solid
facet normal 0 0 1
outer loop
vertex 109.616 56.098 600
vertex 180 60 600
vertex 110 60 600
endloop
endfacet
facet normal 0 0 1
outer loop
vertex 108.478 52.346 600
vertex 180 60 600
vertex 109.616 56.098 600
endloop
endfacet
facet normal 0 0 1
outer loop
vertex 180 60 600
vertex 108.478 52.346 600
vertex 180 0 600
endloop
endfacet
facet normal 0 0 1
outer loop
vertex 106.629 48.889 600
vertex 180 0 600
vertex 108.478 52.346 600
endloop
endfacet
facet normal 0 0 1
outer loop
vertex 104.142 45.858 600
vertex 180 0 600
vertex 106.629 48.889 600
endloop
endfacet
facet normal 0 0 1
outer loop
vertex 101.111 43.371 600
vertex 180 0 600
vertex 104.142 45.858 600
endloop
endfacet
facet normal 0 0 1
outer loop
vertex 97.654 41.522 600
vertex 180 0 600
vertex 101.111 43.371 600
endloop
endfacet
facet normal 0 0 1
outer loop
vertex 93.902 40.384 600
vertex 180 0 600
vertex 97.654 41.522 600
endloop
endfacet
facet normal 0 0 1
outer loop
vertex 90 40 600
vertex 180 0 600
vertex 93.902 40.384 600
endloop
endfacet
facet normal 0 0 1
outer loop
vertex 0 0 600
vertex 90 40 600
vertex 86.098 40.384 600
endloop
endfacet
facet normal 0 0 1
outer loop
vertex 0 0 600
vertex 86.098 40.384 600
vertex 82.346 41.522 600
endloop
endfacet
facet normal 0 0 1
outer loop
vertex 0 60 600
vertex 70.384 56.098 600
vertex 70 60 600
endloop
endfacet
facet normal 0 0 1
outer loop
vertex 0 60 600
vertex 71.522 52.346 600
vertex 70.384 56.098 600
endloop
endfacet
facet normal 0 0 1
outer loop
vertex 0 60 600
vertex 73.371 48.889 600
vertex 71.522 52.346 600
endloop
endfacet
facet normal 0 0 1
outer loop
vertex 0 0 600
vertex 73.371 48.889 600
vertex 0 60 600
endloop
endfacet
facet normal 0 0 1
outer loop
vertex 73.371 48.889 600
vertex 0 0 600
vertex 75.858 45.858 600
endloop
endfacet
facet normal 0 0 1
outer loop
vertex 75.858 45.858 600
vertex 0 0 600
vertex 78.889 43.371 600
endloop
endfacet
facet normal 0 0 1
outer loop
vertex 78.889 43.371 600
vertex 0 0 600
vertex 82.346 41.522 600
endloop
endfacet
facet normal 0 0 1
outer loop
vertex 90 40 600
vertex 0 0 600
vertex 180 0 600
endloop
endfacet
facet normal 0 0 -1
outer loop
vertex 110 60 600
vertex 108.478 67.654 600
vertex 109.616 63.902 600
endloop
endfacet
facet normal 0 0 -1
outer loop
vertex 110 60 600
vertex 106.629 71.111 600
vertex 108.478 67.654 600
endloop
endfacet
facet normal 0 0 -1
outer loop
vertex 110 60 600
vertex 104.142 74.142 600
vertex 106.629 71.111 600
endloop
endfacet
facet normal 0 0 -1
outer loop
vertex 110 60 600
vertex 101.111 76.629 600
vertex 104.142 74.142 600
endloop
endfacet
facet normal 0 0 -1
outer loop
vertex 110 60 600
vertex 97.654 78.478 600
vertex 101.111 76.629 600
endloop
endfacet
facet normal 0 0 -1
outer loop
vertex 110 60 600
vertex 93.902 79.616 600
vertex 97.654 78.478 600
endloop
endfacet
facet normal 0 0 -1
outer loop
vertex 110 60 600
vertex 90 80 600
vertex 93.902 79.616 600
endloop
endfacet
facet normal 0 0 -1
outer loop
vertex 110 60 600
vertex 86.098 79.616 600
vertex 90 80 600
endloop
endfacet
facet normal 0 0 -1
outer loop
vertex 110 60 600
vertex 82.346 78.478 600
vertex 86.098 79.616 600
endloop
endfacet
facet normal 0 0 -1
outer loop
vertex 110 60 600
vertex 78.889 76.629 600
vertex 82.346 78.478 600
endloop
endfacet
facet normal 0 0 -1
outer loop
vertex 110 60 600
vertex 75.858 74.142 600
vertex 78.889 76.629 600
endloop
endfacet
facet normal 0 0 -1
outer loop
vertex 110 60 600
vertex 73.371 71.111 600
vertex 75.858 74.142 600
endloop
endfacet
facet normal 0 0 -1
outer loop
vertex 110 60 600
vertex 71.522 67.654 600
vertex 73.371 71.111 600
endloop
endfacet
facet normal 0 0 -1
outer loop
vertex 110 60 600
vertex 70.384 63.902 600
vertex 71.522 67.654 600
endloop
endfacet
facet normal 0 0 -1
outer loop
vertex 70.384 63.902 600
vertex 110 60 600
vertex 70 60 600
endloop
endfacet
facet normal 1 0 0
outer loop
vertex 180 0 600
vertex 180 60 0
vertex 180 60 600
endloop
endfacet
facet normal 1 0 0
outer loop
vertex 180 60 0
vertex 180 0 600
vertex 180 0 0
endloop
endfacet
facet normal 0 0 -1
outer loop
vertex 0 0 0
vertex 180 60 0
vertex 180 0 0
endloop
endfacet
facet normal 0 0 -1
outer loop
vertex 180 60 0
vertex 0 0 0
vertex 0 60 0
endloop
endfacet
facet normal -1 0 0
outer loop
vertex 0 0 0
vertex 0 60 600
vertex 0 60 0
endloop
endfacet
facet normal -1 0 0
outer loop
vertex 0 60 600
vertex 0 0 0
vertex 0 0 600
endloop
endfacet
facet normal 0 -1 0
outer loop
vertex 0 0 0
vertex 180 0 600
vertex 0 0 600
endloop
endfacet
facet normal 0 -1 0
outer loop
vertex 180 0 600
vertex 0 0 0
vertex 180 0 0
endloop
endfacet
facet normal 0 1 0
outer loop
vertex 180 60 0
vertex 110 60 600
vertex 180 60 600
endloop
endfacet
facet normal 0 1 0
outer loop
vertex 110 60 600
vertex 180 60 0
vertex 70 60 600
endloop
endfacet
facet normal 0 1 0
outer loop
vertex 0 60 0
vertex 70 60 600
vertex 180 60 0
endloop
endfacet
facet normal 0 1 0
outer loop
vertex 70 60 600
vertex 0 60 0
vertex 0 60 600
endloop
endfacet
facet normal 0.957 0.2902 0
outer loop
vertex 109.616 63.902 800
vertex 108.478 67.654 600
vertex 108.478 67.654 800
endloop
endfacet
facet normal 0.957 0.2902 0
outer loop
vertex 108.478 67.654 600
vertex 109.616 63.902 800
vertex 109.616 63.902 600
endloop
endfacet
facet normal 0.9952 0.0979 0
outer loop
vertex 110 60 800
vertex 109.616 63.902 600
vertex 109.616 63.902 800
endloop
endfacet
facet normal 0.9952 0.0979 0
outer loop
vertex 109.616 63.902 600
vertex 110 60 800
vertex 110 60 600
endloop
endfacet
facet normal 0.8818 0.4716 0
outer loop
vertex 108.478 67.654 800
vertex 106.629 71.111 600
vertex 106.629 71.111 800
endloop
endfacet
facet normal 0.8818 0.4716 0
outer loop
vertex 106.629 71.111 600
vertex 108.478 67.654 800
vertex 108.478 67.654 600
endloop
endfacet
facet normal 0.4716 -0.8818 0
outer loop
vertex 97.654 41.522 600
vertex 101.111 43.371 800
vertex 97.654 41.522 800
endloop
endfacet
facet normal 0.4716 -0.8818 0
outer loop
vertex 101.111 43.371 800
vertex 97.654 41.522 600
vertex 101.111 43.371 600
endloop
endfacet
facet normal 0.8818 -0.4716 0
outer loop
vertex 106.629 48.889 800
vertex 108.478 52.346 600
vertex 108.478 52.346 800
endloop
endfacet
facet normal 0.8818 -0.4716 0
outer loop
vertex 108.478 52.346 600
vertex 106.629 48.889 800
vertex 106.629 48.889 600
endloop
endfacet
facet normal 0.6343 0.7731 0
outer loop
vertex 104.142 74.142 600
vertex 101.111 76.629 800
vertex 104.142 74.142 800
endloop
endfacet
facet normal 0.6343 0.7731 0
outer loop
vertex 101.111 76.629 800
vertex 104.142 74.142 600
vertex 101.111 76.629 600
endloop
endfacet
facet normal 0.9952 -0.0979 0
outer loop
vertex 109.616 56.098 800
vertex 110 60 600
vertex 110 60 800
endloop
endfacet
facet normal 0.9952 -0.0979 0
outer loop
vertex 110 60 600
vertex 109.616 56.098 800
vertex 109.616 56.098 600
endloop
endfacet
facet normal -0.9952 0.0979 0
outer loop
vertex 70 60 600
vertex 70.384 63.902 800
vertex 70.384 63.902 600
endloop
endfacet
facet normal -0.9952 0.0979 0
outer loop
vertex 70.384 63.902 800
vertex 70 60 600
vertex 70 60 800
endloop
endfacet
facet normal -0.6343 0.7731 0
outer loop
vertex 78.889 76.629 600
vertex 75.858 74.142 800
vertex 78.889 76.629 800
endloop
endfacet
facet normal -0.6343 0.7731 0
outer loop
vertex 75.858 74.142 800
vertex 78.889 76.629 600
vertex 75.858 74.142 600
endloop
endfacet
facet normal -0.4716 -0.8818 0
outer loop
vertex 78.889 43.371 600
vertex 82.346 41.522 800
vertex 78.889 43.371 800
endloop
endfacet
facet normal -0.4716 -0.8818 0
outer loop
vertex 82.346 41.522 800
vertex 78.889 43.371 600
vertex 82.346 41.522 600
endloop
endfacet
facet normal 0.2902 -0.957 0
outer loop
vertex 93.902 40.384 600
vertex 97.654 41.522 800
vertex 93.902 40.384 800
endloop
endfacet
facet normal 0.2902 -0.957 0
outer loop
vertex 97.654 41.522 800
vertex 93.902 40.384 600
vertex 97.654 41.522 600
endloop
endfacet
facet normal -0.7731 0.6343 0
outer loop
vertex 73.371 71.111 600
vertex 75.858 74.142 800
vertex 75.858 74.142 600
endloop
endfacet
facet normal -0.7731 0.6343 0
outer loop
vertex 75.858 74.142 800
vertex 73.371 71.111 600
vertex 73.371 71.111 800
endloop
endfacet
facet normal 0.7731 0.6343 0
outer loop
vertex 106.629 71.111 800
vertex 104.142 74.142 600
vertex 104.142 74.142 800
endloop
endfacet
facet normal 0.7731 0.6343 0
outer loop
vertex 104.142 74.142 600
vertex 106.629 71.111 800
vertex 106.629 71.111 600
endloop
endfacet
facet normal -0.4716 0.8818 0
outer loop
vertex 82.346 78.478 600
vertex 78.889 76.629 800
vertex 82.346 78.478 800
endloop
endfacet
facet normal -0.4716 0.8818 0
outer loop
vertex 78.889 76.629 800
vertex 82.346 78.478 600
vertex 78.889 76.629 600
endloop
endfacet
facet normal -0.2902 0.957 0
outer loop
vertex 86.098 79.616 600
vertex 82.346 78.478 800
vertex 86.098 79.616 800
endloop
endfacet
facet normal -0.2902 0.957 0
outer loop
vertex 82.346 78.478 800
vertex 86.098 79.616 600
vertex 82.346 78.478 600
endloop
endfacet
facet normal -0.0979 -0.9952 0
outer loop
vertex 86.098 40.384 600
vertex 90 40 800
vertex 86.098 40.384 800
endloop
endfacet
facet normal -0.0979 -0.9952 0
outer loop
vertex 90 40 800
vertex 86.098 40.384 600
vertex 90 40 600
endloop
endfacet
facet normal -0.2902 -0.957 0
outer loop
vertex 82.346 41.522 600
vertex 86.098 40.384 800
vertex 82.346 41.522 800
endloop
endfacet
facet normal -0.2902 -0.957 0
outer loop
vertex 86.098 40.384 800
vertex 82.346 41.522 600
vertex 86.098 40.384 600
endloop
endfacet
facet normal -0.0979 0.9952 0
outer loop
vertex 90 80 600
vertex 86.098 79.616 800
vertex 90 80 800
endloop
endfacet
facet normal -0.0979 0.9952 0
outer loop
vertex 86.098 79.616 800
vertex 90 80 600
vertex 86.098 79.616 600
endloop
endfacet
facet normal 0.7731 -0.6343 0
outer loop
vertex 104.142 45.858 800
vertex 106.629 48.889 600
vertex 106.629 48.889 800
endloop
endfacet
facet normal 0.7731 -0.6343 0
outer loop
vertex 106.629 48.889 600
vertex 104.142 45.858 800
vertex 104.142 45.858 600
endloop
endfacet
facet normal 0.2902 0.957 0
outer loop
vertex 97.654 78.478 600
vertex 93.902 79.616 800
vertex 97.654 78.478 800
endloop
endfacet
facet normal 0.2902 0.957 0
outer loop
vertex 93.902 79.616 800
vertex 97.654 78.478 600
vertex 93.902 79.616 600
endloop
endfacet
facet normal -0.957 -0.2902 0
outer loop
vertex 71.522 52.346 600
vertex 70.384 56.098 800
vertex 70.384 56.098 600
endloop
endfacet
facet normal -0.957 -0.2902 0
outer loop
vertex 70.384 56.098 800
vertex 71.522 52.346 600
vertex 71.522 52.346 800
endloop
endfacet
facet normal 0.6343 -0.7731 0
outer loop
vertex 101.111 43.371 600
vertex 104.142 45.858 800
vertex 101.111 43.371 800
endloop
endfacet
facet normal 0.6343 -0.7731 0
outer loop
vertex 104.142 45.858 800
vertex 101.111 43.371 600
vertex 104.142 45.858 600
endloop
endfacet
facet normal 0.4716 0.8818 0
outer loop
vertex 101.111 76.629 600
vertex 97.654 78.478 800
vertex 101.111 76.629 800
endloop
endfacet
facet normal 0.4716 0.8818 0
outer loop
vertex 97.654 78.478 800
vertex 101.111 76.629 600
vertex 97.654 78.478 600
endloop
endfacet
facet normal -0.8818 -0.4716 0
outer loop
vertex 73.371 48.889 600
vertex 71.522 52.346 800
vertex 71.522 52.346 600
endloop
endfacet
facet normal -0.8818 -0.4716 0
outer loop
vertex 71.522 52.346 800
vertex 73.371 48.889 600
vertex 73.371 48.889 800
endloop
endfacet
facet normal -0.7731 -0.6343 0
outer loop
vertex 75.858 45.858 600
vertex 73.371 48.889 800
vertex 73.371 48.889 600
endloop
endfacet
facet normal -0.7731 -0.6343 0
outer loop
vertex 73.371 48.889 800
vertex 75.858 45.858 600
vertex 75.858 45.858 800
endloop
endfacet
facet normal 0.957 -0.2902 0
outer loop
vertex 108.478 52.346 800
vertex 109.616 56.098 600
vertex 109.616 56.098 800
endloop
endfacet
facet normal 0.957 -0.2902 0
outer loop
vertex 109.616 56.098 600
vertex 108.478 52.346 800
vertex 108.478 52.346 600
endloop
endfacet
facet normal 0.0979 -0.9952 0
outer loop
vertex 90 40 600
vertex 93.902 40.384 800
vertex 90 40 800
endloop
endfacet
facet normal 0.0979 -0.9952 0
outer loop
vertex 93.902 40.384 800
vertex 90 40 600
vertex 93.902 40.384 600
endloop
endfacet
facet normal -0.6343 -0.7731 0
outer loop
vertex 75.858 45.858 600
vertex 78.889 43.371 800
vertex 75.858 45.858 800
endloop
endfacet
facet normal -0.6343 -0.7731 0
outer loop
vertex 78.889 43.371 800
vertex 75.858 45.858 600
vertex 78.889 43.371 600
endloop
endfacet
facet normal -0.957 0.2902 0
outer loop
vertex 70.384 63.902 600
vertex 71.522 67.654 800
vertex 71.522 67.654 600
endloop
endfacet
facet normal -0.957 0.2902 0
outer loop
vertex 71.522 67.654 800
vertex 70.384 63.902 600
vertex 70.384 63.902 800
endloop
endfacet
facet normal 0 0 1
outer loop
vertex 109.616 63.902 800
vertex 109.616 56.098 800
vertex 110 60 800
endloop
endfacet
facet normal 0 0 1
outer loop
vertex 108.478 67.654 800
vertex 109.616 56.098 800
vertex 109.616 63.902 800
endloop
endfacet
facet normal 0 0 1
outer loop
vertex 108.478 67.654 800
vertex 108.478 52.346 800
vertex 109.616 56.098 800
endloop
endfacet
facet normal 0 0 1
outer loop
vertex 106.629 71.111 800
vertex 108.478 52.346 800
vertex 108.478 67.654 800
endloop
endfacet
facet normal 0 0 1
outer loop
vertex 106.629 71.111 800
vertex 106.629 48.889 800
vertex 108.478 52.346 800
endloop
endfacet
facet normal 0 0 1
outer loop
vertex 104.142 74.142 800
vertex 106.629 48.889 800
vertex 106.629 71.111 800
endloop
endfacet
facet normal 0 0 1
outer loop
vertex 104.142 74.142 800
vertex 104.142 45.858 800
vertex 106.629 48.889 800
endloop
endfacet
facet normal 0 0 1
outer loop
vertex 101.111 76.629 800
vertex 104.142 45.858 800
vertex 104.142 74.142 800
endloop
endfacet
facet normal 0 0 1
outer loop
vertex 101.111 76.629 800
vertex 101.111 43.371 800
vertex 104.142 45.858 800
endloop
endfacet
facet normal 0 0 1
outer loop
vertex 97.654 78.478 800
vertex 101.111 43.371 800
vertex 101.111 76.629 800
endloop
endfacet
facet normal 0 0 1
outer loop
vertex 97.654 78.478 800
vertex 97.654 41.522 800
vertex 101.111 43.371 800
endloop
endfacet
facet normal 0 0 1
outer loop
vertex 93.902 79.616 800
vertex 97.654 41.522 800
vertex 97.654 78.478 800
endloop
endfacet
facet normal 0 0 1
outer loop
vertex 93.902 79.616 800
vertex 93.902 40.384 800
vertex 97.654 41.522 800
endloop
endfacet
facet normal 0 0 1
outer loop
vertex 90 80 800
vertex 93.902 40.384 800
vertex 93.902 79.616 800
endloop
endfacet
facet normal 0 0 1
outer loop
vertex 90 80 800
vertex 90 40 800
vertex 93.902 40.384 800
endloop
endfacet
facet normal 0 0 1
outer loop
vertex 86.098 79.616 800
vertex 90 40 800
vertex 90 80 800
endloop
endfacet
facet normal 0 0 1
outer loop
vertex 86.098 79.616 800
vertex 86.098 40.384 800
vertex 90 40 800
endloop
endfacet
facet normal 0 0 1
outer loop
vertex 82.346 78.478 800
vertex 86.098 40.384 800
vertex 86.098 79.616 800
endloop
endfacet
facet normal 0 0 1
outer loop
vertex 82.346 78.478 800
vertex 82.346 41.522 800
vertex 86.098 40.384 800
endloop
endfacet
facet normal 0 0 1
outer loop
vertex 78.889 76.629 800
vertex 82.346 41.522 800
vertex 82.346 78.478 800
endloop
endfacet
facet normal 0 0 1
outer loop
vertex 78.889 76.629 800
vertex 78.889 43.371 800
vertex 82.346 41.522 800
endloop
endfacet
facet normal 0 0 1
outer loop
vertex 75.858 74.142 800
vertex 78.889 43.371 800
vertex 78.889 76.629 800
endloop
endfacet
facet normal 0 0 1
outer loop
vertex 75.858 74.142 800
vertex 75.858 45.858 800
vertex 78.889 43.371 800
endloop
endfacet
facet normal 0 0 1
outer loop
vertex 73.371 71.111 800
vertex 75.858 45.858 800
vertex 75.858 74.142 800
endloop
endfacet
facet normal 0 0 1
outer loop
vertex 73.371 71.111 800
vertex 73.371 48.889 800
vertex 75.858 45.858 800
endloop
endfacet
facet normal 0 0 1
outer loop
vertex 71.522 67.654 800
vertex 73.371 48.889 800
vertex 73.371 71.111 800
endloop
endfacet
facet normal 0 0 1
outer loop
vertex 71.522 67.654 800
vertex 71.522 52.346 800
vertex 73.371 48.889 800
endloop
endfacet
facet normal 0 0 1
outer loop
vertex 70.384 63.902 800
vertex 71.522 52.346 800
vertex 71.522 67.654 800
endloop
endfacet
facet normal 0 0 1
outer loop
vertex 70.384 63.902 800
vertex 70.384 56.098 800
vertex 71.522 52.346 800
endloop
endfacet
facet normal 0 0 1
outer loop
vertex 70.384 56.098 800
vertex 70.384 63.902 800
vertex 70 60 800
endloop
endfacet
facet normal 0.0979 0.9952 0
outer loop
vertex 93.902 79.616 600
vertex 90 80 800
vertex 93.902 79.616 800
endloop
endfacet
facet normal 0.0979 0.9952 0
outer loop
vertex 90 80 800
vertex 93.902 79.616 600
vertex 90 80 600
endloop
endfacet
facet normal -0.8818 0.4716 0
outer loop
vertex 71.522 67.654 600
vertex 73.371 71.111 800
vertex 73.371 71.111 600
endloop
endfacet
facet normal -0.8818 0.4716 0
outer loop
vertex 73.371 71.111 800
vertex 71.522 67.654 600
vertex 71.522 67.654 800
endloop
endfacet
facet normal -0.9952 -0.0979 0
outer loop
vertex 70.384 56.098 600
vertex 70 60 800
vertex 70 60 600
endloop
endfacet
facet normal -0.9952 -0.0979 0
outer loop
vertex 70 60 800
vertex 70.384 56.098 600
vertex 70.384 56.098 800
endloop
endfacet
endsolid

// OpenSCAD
// leg_socket.scad
// Janis Product Design — Pilates Reformer PR-01-base — module file
// NOT individually versioned (same flat-file exception as pole_top.scad —
// see PR-01-multifile-split-v25 Task A note, PR-01-flatten-modules-v26).
// History tracked by git commit + the version number of whichever
// PR-01-assembly-vXX.scad includes it.
//
// New 2026-07-02 (pole-base-bell-collar-socket-build): embedded leg +
// deep pass-through socket sleeve. First-time CONFIRMED via Customizer
// screenshot (pole_top_housing_customizer leg/bed panel) — replaces the
// old shallow bonded pocket concept. NOTE: pole_wood_socket() (in
// pole_top.scad, socket_depth=20mm placeholder) remains actively called
// alongside this new leg_socket() — this prompt only added the new
// component, it did not retire the old shallow-socket call site (only
// the split-clamp collar retirement was explicitly requested). Flagging
// this as a likely redundancy for Claude Web/Janis to resolve, not
// silently reconciling it here.
//
// NAMING: this file's socket parameters are named leg_socket_od /
// leg_socket_wall_t / leg_socket_depth — deliberately NOT socket_od /
// socket_depth, which already exist as PR-01-assembly globals (60mm/20mm,
// used by pole_wood_socket()). Reusing those names would silently
// override pole_wood_socket()'s values via OpenSCAD's "last declaration
// wins" duplicate-variable behavior (rules-codes.md) — the exact class of
// invisible bug already chased twice this project (v27 ghost-leak,
// fix-pole-cx-cy-override-bug). Renamed to avoid it outright.

function ghost_mode() = is_undef($is_assembly) || !$is_assembly;

// ── Standalone-safe defaults ──────────────────────────────────────────
// Same is_undef() self-guard convention as pole_top.scad's existing
// block — dormant-but-functional pattern (NOT the fully collision-proof
// local-fallback pattern used for pole_cx/pole_cy specifically, which was
// only necessary because that one had actually diverged — see
// fix-pole-cx-cy-override-bug cc_chat_log entry, 2026-07-02). This is a
// known, already-flagged, project-wide standing risk (correct today
// because fallback values are kept in sync with the assembly's real
// values), not a new defect introduced here.
leg_w              = is_undef(leg_w)              ? 180  : leg_w;   // shared global, also used by bed_frame()/pole_top.scad
leg_t              = is_undef(leg_t)              ? 120  : leg_t;   // shared global
pole_d             = is_undef(pole_d)             ? 40   : pole_d;  // shared global, LOCKED
e                  = is_undef(e)                  ? 0.01 : e;       // shared global, epsilon
leg_h              = is_undef(leg_h)              ? 600  : leg_h;
pad_t              = is_undef(pad_t)              ? 20   : pad_t;
pad_overhang       = is_undef(pad_overhang)       ? 50   : pad_overhang;
leg_socket_od      = is_undef(leg_socket_od)      ? 46   : leg_socket_od;
leg_socket_wall_t  = is_undef(leg_socket_wall_t)  ? 2.5  : leg_socket_wall_t;
leg_socket_depth   = is_undef(leg_socket_depth)   ? 400  : leg_socket_depth;

leg_socket_id = leg_socket_od - 2 * leg_socket_wall_t;  // 41mm
// Radial clearance vs pole_d(40mm) = (leg_socket_id - pole_d)/2 = 0.5mm —
// tight tolerance, not a blocker, but flagged for print/fit tolerance
// awareness (stated explicitly in cc_chat_log per prompt instruction).

// leg_socket(cx, cy) — wood leg + foot pad + embedded pass-through
// socket sleeve. Leg spans floor (Z=0) to leg_h (600mm) — INTERPRETATION
// FLAG: leg_h was not reconciled against bed_h(500mm)/the existing
// bed_frame() leg height (bed_h-surface_t=470mm) anywhere in the prompt;
// this file treats leg_h as this component's own independent full height,
// extending ~100mm above bed_h so the pole continues upward from a
// bell_lock_collar() flush with THIS leg's own top face (matching "pole
// pushes directly into embedded leg socket"). Deliberate, documented
// interpretation — not a confirmed architectural decision, flagged for
// Claude Web/Janis review on the next render pass.
// Socket bore: open at leg top (world Z=leg_h), extends DOWN
// leg_socket_depth(400mm) — leaves 200mm solid wood below the bore for
// structural support (leg_h - leg_socket_depth = 200mm).
module leg_socket(cx, cy) {
    color("#C8A96E", 1.0) {
        translate([cx - leg_w / 2, cy - leg_t / 2, 0])
            cube([leg_w, leg_t, leg_h]);
        // Foot pad removed — Janis-confirmed 2026-07-02, was never part of the
        // intended design, only surfaced on first visual render. pad_t/
        // pad_overhang variables kept (unused) for history; do not resurrect
        // this call without Janis re-confirming.
        // translate([cx - leg_w / 2 - pad_overhang, cy - leg_t / 2 - pad_overhang, 0])
        //     cube([leg_w + 2 * pad_overhang, leg_t + 2 * pad_overhang, pad_t]);
    }
    color("#888888", 1.0)
        translate([cx, cy, leg_h - leg_socket_depth])
            difference() {
                cylinder(h = leg_socket_depth, d = leg_socket_od, $fn = 64);
                translate([0, 0, -e])
                    cylinder(h = leg_socket_depth + 2 * e, d = leg_socket_id, $fn = 64);
            }
}

// ═════════════════════════════════════════════════════════════════════
// GHOST-CONTEXT PREVIEW — standalone/isolated iteration only
// Suppressed in full assembly ($is_assembly=true set by the assembly
// file before the include). Shows leg_socket()'s real geometry plus a
// gray (30% opacity) simple stand-in for the mating pole stub it does
// not itself contain — positioned above the socket, diameter pole_d.
// ghost_cx/ghost_cy use distinct LOCAL names with their own is_undef()
// fallback — mirrors pole_top.scad's post-fix pattern exactly; pole_cx/
// pole_cy themselves are never reassigned here (same reasoning as the
// fix-pole-cx-cy-override-bug fix — reassigning a global the assembly
// also assigns collapses to the fallback under include scope-flattening).
// ═════════════════════════════════════════════════════════════════════

if (ghost_mode()) {
    ghost_cx = is_undef(pole_cx) ? 90 : pole_cx[0];
    ghost_cy = is_undef(pole_cy) ? 60 : pole_cy[0];
    // Cutaway — standalone-preview only (bed-height-pad-cutaway-fix,
    // 2026-07-02): reveals the embedded socket bore, otherwise fully
    // hidden inside the solid wood leg. Applies only inside ghost_mode();
    // full-assembly render calls leg_socket() directly (unchanged) via
    // PR-01-assembly-vXX.scad's per-pole loop, never this stanza.
    difference() {
        leg_socket(ghost_cx, ghost_cy);
        translate([ghost_cx - leg_w, ghost_cy, -e])
            cube([leg_w * 2, leg_t, leg_h + 2 * e]);
    }
    color("gray", 0.3)
        translate([ghost_cx, ghost_cy, leg_h])
            cylinder(h = 200, d = pole_d, $fn = 32);
}
